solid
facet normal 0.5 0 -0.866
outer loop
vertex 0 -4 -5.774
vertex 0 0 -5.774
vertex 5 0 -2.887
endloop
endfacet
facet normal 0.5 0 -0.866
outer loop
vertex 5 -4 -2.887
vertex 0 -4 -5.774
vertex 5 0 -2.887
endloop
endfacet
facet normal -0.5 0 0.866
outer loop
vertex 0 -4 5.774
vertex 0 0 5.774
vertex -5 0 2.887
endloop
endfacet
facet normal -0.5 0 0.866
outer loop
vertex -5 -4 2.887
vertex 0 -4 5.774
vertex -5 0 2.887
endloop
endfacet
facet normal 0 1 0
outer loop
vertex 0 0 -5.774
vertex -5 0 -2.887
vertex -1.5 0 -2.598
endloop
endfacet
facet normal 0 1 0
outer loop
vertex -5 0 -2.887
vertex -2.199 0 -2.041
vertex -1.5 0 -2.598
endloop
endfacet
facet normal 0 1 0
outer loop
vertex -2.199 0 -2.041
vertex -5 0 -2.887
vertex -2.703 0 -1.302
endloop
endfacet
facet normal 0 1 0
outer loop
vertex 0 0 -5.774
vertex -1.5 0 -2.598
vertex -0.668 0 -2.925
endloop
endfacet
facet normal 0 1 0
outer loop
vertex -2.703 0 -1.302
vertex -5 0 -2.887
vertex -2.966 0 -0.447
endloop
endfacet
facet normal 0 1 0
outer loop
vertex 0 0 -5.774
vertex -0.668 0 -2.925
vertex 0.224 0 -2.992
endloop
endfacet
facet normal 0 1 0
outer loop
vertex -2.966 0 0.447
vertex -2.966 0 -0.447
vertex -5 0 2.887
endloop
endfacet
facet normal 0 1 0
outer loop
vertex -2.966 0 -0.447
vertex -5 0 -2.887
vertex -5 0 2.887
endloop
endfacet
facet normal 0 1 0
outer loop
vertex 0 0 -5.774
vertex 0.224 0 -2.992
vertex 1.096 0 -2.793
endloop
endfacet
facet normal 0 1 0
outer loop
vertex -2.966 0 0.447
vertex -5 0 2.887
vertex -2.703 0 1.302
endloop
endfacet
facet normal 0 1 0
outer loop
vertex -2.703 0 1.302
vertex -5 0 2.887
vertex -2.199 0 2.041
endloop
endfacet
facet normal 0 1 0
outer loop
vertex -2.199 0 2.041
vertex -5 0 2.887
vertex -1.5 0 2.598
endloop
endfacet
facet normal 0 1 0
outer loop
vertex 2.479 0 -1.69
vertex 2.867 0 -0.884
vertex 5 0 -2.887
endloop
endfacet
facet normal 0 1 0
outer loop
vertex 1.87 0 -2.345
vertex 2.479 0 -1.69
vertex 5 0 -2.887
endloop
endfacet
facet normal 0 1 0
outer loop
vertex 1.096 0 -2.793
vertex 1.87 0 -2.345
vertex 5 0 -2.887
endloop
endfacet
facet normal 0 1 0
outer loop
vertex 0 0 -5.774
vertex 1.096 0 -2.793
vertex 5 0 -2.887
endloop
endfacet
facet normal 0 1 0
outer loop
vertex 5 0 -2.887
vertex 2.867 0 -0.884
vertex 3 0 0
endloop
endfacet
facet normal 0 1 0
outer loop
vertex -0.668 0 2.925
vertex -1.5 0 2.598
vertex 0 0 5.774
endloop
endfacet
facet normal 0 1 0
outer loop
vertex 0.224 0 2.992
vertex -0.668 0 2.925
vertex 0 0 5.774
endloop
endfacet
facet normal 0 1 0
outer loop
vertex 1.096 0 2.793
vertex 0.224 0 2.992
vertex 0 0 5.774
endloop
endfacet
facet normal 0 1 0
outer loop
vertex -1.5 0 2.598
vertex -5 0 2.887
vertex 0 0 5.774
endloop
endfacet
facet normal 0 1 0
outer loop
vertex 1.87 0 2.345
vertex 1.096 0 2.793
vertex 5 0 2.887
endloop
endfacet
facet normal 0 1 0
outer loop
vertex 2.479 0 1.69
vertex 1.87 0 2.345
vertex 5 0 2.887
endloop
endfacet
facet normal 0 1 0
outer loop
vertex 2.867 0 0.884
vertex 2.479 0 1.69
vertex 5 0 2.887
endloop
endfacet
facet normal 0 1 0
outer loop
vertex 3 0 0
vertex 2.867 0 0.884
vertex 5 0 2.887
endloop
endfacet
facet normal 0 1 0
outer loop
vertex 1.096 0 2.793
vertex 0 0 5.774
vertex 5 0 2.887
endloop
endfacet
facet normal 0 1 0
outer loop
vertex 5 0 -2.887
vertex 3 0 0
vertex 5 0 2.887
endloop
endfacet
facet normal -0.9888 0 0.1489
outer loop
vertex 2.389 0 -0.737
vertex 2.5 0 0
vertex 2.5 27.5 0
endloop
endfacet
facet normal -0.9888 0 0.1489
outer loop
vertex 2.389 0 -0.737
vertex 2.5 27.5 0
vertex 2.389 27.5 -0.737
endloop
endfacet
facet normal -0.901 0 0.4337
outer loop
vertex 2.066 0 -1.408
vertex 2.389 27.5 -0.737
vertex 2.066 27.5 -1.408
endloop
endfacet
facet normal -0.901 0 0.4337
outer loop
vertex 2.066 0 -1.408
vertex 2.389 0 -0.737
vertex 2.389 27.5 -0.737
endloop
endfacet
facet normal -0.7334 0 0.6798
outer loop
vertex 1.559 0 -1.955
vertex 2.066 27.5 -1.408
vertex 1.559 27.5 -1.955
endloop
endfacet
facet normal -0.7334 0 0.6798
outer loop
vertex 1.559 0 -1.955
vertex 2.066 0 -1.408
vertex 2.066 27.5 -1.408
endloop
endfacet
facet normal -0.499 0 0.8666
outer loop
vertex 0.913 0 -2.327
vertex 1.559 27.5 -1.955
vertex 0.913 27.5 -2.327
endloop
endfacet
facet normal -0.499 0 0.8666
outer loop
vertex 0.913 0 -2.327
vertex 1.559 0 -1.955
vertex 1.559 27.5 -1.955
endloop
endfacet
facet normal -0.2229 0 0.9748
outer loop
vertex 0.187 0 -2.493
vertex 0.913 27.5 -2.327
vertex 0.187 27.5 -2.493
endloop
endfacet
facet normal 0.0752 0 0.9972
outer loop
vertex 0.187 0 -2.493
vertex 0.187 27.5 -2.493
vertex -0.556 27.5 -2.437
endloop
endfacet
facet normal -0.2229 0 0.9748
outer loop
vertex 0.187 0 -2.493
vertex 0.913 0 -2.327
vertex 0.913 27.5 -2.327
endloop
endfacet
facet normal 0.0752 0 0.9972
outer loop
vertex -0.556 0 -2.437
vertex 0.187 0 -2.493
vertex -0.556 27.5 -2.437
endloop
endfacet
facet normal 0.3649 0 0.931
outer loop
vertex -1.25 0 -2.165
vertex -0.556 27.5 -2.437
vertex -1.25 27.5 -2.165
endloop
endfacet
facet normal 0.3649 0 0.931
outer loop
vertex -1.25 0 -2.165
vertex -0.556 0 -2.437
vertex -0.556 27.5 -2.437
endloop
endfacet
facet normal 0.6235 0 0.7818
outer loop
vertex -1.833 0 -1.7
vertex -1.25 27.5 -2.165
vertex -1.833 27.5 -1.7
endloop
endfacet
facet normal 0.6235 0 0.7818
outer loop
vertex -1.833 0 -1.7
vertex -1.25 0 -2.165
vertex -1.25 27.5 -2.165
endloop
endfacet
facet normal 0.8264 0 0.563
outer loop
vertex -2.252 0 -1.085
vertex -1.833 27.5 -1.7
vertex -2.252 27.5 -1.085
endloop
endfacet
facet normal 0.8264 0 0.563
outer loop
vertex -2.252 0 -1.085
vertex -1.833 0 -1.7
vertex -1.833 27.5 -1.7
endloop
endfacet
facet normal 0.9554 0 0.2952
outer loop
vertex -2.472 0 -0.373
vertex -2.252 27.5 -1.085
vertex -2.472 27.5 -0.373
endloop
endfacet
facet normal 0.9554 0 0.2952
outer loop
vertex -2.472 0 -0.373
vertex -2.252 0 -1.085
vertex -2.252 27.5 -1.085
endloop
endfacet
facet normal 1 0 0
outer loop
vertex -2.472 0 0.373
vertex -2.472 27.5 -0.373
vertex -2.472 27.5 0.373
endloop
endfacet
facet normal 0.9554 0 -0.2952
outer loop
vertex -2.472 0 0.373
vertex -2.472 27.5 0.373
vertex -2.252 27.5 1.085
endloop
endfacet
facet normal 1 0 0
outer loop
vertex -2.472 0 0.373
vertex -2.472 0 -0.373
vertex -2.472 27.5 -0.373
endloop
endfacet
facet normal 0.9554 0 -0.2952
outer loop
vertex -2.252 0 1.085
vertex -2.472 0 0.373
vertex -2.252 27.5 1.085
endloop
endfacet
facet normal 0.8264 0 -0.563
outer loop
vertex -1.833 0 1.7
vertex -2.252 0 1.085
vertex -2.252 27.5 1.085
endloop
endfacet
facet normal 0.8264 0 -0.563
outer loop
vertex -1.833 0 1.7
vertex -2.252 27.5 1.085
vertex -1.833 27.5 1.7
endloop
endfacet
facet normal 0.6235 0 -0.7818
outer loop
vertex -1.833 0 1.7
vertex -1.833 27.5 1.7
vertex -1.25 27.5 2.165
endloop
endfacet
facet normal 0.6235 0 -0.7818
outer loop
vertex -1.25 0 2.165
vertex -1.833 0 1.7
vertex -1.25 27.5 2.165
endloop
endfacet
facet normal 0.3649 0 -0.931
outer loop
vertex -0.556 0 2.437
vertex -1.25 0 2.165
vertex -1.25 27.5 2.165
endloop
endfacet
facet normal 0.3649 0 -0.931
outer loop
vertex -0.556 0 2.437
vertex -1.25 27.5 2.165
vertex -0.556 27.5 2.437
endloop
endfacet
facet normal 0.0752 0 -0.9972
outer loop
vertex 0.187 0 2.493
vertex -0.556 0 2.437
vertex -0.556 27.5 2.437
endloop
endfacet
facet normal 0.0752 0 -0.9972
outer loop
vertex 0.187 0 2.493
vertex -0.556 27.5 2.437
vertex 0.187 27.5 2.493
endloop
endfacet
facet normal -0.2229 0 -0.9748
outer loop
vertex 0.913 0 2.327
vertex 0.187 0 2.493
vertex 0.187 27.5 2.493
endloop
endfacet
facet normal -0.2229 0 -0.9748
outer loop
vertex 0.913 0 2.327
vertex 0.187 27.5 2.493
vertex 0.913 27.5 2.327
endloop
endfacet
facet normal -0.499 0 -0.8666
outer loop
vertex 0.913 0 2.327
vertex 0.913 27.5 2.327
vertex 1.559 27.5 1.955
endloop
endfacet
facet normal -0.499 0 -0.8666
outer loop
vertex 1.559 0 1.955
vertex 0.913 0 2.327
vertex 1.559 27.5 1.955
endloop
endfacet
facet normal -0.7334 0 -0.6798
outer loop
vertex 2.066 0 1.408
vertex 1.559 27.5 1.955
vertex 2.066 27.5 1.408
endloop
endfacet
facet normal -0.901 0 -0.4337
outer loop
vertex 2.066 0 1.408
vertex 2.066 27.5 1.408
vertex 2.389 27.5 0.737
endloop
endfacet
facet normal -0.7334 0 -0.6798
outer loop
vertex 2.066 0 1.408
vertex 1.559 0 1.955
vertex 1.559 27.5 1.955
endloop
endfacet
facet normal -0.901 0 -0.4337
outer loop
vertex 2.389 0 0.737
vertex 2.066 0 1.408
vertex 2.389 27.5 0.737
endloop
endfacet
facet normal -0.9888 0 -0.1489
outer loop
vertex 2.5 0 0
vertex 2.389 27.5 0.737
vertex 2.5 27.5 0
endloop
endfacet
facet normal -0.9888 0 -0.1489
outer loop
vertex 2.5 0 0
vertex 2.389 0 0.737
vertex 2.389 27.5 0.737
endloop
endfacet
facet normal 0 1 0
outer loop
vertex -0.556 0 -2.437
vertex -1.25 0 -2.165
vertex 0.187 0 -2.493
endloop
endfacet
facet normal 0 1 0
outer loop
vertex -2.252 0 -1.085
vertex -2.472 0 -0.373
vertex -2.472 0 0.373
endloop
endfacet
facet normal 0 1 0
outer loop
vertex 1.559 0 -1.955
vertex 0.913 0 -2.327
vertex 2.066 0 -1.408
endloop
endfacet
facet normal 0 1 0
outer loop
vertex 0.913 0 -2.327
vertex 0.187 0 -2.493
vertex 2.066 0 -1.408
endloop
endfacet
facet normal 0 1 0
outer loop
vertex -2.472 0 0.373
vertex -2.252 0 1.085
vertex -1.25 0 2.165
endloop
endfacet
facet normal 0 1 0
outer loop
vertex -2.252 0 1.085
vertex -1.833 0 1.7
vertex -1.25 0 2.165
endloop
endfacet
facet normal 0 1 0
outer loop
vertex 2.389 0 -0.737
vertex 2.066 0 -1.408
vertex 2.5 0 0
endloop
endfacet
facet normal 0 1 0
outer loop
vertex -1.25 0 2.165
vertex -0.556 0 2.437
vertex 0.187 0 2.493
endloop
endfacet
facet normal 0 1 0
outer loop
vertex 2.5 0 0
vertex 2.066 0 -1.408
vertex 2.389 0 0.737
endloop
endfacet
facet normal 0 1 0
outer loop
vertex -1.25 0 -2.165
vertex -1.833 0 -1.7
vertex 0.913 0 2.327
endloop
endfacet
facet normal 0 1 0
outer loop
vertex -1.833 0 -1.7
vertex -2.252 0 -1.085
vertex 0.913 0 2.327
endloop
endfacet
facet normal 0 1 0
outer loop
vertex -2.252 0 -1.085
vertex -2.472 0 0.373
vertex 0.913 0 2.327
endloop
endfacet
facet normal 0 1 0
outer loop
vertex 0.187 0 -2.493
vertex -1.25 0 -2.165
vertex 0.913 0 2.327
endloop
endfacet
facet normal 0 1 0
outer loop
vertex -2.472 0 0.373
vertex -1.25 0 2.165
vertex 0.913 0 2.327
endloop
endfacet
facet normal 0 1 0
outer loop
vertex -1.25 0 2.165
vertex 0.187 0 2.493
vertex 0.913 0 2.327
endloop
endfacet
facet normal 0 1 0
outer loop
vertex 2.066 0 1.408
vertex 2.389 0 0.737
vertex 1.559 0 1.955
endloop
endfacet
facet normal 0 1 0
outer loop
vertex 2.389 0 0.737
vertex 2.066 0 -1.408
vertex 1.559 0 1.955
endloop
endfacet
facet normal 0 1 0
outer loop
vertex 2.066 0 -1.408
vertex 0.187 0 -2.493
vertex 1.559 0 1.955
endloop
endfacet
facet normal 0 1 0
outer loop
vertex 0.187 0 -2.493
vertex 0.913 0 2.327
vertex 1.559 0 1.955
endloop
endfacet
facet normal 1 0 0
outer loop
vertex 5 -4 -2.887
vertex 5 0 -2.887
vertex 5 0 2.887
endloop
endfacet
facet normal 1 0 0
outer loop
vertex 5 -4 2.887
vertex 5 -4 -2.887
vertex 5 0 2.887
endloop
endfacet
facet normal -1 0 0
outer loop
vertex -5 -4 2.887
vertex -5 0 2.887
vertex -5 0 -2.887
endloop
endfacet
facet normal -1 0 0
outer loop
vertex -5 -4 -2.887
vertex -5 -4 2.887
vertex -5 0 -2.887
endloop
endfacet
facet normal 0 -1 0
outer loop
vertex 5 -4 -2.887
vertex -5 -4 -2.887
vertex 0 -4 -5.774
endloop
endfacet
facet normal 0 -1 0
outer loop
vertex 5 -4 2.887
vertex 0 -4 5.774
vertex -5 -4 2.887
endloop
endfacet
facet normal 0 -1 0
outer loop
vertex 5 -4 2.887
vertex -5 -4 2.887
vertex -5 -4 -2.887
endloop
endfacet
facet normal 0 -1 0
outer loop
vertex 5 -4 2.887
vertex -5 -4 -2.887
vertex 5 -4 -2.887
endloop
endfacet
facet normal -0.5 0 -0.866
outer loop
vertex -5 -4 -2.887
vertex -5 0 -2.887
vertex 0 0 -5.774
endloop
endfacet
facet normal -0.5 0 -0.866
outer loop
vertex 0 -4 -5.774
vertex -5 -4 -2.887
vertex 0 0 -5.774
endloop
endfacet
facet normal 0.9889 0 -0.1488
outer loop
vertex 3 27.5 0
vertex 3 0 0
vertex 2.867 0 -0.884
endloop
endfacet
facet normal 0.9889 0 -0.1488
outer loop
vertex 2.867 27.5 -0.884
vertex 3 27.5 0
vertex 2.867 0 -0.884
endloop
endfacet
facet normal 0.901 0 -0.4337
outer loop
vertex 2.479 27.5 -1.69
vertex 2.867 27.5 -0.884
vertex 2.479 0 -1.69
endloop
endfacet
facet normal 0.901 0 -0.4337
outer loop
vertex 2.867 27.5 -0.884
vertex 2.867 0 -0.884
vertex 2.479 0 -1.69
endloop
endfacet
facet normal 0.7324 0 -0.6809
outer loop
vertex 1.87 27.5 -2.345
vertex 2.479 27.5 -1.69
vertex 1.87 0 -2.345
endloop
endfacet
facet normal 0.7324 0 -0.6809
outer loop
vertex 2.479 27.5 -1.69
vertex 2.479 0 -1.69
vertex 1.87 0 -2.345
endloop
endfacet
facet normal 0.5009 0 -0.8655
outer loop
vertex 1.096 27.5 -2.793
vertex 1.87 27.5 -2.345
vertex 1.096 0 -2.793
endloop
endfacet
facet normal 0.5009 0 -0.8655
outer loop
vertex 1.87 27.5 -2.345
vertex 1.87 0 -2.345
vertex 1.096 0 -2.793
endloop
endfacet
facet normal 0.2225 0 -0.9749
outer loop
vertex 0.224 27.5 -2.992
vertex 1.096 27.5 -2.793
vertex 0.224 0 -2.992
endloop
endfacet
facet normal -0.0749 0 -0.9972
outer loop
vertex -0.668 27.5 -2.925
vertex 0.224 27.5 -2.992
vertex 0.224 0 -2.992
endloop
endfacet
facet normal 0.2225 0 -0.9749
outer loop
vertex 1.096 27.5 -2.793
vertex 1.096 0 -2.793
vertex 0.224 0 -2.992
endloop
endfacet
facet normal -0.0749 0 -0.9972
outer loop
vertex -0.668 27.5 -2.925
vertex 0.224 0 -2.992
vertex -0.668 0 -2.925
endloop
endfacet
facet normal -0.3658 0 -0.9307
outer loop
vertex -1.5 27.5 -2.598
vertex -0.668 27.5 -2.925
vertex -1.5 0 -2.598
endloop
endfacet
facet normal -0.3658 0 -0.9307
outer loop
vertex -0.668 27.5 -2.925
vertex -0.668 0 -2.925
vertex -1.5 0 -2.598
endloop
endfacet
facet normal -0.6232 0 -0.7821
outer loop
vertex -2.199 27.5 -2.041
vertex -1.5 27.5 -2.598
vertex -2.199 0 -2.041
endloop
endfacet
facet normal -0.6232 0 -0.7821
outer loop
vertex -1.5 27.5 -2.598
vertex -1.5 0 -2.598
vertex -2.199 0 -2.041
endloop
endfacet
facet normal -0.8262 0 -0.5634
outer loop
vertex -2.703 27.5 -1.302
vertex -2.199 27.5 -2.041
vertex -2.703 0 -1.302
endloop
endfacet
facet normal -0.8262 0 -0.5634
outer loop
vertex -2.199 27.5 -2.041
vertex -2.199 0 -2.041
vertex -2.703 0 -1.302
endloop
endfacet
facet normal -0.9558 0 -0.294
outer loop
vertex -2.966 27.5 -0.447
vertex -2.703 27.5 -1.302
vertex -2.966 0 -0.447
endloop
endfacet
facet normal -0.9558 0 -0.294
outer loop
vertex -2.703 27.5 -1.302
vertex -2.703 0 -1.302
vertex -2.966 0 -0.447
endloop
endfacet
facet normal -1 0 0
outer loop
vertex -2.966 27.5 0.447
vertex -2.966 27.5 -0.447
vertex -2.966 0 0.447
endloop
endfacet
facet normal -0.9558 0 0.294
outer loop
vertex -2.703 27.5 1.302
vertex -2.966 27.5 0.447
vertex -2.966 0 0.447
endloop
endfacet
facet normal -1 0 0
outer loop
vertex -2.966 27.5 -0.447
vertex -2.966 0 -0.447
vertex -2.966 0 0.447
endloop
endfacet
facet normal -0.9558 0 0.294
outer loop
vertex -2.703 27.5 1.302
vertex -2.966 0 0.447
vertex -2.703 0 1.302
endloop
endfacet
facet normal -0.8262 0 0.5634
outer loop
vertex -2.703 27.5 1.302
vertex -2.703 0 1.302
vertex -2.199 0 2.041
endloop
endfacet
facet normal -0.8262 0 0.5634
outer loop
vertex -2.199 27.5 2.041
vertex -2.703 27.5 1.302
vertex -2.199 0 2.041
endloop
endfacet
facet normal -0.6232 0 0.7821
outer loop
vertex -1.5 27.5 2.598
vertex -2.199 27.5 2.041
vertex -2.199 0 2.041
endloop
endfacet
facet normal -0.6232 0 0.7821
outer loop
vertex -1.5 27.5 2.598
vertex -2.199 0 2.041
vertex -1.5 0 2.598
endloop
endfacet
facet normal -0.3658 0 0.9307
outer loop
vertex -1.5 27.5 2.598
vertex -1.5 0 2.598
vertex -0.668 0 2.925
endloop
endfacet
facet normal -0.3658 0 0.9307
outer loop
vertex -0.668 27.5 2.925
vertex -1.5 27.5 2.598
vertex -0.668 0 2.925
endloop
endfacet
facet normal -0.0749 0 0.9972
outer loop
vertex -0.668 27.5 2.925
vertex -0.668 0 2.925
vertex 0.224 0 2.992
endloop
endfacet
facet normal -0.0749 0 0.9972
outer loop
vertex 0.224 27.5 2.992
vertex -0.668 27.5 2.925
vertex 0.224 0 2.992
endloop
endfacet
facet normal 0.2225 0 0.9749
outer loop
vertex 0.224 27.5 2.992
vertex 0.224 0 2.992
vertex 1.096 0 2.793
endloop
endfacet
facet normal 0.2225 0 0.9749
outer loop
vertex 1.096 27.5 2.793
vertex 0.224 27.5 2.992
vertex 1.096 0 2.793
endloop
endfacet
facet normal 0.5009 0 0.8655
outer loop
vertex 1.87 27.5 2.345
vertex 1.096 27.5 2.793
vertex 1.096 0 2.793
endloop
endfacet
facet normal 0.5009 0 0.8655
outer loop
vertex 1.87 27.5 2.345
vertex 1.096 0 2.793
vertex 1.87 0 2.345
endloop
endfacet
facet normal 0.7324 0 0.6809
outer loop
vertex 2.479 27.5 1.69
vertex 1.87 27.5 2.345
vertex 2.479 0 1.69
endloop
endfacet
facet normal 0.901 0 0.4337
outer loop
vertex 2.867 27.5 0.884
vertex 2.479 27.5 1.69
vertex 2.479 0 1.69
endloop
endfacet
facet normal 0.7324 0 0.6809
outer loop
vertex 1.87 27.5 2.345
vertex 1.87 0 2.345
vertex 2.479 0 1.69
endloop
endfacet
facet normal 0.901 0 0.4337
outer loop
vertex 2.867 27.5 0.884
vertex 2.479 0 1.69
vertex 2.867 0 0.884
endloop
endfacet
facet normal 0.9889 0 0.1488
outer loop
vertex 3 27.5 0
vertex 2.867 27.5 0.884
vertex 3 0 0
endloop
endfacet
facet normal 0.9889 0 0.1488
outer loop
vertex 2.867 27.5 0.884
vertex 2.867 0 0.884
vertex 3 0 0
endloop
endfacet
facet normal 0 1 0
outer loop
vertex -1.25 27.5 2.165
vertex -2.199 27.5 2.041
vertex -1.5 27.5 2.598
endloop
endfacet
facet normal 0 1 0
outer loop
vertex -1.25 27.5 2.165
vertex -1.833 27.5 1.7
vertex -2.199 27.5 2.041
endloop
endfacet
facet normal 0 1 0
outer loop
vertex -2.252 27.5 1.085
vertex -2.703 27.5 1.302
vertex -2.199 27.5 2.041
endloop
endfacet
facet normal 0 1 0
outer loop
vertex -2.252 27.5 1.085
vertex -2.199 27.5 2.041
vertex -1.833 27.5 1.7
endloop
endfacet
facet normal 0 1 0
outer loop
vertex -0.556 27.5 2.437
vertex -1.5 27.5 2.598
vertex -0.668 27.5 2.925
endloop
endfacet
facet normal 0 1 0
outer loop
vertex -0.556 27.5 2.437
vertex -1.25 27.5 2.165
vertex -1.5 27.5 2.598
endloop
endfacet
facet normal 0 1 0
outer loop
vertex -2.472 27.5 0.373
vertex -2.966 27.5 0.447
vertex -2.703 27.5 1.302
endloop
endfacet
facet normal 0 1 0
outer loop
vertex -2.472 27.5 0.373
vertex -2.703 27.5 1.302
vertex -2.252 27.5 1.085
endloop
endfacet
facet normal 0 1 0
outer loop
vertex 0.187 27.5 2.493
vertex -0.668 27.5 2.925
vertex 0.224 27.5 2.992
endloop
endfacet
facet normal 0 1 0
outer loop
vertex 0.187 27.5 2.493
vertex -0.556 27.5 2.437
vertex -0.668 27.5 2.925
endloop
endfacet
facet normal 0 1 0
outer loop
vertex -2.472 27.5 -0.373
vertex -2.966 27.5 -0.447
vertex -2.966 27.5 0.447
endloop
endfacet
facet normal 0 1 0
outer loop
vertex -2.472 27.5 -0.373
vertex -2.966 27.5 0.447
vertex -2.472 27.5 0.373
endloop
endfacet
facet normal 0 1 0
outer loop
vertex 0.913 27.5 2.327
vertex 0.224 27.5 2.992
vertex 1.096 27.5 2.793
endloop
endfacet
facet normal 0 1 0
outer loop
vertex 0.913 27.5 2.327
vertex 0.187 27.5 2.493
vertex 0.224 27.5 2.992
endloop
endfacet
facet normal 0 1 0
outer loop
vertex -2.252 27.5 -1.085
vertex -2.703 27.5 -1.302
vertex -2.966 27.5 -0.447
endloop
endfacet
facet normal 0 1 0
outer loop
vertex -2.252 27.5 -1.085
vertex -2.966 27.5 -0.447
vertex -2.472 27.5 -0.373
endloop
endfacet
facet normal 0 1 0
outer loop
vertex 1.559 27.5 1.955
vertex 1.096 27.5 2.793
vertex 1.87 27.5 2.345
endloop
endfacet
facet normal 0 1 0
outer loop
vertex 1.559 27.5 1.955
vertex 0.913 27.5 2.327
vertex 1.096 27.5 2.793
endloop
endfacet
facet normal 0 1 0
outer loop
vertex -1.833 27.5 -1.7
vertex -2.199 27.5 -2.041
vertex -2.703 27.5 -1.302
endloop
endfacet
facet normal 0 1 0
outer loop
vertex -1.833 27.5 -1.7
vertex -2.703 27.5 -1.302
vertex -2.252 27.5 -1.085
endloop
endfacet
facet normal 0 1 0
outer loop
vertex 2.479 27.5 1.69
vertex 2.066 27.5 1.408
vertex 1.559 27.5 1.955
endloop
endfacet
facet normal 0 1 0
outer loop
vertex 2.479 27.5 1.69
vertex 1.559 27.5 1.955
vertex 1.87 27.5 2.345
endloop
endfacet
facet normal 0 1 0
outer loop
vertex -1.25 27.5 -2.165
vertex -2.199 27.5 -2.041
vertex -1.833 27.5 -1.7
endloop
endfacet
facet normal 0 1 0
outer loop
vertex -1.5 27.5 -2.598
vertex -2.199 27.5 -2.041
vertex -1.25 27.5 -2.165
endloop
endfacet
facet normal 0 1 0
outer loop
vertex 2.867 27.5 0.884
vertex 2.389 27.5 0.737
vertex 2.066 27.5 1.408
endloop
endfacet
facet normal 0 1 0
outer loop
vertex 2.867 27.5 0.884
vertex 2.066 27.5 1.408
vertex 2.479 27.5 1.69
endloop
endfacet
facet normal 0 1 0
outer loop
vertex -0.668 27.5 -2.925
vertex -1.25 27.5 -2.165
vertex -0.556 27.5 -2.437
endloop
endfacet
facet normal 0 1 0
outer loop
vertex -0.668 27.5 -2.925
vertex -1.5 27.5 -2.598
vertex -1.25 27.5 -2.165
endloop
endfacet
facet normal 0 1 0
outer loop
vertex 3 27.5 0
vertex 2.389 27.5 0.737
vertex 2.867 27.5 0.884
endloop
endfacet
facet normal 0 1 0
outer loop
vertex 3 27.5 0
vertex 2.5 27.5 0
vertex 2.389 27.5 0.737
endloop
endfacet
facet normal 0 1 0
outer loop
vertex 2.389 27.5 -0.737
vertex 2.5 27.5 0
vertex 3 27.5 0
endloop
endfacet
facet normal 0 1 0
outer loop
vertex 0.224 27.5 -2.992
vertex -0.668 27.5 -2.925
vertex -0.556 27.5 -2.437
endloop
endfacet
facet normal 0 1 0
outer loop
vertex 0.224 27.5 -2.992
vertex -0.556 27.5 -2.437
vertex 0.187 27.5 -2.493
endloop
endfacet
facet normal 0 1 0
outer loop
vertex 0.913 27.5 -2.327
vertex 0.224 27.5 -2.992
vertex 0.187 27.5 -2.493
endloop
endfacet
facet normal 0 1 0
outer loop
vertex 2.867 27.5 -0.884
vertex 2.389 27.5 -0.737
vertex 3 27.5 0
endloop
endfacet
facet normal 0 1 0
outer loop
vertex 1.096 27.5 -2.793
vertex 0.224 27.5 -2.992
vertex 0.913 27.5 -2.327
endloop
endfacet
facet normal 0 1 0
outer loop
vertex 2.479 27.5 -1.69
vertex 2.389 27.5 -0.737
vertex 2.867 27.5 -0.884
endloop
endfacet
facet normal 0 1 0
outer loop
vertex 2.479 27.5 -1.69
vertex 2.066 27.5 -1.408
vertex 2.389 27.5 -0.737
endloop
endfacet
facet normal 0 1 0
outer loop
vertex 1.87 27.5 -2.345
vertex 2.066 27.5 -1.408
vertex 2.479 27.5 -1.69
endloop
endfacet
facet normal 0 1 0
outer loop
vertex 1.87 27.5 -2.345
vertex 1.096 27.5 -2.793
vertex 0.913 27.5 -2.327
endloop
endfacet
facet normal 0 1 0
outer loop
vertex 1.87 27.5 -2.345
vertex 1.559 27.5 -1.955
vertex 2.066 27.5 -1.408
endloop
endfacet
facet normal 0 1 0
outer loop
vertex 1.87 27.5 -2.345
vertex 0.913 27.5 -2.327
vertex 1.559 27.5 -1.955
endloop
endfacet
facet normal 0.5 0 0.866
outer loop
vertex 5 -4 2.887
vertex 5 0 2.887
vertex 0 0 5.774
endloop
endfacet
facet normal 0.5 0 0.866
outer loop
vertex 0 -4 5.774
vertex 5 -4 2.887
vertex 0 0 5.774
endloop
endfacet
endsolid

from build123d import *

# Parameters (mm, degrees)
SKETCH1_R           = 3
SKETCH1_R_2         = 2.5
BOSS_EXTRUDE1_DEPTH = 27.5
BOSS_EXTRUDE2_DEPTH = 4


with BuildPart() as part:
    # Sketch1 → Boss-Extrude1 (new body)
    with BuildSketch(Plane(origin=(0, 0, 0), x_dir=(1, 0, 0), z_dir=(0, 1, 0))):
        Circle(SKETCH1_R)
        Circle(SKETCH1_R_2, mode=Mode.SUBTRACT)
    extrude(amount=BOSS_EXTRUDE1_DEPTH)

    # Sketch2 → Boss-Extrude2 (add)
    with BuildSketch(Plane.XZ):
        Polygon((0, 5.773502692), (-5, 2.886751346), (-5, -2.886751346), (0, -5.773502692), (5, -2.886751346), (5, 2.886751346), align=None)
    extrude(amount=BOSS_EXTRUDE2_DEPTH)


solid = part.part
